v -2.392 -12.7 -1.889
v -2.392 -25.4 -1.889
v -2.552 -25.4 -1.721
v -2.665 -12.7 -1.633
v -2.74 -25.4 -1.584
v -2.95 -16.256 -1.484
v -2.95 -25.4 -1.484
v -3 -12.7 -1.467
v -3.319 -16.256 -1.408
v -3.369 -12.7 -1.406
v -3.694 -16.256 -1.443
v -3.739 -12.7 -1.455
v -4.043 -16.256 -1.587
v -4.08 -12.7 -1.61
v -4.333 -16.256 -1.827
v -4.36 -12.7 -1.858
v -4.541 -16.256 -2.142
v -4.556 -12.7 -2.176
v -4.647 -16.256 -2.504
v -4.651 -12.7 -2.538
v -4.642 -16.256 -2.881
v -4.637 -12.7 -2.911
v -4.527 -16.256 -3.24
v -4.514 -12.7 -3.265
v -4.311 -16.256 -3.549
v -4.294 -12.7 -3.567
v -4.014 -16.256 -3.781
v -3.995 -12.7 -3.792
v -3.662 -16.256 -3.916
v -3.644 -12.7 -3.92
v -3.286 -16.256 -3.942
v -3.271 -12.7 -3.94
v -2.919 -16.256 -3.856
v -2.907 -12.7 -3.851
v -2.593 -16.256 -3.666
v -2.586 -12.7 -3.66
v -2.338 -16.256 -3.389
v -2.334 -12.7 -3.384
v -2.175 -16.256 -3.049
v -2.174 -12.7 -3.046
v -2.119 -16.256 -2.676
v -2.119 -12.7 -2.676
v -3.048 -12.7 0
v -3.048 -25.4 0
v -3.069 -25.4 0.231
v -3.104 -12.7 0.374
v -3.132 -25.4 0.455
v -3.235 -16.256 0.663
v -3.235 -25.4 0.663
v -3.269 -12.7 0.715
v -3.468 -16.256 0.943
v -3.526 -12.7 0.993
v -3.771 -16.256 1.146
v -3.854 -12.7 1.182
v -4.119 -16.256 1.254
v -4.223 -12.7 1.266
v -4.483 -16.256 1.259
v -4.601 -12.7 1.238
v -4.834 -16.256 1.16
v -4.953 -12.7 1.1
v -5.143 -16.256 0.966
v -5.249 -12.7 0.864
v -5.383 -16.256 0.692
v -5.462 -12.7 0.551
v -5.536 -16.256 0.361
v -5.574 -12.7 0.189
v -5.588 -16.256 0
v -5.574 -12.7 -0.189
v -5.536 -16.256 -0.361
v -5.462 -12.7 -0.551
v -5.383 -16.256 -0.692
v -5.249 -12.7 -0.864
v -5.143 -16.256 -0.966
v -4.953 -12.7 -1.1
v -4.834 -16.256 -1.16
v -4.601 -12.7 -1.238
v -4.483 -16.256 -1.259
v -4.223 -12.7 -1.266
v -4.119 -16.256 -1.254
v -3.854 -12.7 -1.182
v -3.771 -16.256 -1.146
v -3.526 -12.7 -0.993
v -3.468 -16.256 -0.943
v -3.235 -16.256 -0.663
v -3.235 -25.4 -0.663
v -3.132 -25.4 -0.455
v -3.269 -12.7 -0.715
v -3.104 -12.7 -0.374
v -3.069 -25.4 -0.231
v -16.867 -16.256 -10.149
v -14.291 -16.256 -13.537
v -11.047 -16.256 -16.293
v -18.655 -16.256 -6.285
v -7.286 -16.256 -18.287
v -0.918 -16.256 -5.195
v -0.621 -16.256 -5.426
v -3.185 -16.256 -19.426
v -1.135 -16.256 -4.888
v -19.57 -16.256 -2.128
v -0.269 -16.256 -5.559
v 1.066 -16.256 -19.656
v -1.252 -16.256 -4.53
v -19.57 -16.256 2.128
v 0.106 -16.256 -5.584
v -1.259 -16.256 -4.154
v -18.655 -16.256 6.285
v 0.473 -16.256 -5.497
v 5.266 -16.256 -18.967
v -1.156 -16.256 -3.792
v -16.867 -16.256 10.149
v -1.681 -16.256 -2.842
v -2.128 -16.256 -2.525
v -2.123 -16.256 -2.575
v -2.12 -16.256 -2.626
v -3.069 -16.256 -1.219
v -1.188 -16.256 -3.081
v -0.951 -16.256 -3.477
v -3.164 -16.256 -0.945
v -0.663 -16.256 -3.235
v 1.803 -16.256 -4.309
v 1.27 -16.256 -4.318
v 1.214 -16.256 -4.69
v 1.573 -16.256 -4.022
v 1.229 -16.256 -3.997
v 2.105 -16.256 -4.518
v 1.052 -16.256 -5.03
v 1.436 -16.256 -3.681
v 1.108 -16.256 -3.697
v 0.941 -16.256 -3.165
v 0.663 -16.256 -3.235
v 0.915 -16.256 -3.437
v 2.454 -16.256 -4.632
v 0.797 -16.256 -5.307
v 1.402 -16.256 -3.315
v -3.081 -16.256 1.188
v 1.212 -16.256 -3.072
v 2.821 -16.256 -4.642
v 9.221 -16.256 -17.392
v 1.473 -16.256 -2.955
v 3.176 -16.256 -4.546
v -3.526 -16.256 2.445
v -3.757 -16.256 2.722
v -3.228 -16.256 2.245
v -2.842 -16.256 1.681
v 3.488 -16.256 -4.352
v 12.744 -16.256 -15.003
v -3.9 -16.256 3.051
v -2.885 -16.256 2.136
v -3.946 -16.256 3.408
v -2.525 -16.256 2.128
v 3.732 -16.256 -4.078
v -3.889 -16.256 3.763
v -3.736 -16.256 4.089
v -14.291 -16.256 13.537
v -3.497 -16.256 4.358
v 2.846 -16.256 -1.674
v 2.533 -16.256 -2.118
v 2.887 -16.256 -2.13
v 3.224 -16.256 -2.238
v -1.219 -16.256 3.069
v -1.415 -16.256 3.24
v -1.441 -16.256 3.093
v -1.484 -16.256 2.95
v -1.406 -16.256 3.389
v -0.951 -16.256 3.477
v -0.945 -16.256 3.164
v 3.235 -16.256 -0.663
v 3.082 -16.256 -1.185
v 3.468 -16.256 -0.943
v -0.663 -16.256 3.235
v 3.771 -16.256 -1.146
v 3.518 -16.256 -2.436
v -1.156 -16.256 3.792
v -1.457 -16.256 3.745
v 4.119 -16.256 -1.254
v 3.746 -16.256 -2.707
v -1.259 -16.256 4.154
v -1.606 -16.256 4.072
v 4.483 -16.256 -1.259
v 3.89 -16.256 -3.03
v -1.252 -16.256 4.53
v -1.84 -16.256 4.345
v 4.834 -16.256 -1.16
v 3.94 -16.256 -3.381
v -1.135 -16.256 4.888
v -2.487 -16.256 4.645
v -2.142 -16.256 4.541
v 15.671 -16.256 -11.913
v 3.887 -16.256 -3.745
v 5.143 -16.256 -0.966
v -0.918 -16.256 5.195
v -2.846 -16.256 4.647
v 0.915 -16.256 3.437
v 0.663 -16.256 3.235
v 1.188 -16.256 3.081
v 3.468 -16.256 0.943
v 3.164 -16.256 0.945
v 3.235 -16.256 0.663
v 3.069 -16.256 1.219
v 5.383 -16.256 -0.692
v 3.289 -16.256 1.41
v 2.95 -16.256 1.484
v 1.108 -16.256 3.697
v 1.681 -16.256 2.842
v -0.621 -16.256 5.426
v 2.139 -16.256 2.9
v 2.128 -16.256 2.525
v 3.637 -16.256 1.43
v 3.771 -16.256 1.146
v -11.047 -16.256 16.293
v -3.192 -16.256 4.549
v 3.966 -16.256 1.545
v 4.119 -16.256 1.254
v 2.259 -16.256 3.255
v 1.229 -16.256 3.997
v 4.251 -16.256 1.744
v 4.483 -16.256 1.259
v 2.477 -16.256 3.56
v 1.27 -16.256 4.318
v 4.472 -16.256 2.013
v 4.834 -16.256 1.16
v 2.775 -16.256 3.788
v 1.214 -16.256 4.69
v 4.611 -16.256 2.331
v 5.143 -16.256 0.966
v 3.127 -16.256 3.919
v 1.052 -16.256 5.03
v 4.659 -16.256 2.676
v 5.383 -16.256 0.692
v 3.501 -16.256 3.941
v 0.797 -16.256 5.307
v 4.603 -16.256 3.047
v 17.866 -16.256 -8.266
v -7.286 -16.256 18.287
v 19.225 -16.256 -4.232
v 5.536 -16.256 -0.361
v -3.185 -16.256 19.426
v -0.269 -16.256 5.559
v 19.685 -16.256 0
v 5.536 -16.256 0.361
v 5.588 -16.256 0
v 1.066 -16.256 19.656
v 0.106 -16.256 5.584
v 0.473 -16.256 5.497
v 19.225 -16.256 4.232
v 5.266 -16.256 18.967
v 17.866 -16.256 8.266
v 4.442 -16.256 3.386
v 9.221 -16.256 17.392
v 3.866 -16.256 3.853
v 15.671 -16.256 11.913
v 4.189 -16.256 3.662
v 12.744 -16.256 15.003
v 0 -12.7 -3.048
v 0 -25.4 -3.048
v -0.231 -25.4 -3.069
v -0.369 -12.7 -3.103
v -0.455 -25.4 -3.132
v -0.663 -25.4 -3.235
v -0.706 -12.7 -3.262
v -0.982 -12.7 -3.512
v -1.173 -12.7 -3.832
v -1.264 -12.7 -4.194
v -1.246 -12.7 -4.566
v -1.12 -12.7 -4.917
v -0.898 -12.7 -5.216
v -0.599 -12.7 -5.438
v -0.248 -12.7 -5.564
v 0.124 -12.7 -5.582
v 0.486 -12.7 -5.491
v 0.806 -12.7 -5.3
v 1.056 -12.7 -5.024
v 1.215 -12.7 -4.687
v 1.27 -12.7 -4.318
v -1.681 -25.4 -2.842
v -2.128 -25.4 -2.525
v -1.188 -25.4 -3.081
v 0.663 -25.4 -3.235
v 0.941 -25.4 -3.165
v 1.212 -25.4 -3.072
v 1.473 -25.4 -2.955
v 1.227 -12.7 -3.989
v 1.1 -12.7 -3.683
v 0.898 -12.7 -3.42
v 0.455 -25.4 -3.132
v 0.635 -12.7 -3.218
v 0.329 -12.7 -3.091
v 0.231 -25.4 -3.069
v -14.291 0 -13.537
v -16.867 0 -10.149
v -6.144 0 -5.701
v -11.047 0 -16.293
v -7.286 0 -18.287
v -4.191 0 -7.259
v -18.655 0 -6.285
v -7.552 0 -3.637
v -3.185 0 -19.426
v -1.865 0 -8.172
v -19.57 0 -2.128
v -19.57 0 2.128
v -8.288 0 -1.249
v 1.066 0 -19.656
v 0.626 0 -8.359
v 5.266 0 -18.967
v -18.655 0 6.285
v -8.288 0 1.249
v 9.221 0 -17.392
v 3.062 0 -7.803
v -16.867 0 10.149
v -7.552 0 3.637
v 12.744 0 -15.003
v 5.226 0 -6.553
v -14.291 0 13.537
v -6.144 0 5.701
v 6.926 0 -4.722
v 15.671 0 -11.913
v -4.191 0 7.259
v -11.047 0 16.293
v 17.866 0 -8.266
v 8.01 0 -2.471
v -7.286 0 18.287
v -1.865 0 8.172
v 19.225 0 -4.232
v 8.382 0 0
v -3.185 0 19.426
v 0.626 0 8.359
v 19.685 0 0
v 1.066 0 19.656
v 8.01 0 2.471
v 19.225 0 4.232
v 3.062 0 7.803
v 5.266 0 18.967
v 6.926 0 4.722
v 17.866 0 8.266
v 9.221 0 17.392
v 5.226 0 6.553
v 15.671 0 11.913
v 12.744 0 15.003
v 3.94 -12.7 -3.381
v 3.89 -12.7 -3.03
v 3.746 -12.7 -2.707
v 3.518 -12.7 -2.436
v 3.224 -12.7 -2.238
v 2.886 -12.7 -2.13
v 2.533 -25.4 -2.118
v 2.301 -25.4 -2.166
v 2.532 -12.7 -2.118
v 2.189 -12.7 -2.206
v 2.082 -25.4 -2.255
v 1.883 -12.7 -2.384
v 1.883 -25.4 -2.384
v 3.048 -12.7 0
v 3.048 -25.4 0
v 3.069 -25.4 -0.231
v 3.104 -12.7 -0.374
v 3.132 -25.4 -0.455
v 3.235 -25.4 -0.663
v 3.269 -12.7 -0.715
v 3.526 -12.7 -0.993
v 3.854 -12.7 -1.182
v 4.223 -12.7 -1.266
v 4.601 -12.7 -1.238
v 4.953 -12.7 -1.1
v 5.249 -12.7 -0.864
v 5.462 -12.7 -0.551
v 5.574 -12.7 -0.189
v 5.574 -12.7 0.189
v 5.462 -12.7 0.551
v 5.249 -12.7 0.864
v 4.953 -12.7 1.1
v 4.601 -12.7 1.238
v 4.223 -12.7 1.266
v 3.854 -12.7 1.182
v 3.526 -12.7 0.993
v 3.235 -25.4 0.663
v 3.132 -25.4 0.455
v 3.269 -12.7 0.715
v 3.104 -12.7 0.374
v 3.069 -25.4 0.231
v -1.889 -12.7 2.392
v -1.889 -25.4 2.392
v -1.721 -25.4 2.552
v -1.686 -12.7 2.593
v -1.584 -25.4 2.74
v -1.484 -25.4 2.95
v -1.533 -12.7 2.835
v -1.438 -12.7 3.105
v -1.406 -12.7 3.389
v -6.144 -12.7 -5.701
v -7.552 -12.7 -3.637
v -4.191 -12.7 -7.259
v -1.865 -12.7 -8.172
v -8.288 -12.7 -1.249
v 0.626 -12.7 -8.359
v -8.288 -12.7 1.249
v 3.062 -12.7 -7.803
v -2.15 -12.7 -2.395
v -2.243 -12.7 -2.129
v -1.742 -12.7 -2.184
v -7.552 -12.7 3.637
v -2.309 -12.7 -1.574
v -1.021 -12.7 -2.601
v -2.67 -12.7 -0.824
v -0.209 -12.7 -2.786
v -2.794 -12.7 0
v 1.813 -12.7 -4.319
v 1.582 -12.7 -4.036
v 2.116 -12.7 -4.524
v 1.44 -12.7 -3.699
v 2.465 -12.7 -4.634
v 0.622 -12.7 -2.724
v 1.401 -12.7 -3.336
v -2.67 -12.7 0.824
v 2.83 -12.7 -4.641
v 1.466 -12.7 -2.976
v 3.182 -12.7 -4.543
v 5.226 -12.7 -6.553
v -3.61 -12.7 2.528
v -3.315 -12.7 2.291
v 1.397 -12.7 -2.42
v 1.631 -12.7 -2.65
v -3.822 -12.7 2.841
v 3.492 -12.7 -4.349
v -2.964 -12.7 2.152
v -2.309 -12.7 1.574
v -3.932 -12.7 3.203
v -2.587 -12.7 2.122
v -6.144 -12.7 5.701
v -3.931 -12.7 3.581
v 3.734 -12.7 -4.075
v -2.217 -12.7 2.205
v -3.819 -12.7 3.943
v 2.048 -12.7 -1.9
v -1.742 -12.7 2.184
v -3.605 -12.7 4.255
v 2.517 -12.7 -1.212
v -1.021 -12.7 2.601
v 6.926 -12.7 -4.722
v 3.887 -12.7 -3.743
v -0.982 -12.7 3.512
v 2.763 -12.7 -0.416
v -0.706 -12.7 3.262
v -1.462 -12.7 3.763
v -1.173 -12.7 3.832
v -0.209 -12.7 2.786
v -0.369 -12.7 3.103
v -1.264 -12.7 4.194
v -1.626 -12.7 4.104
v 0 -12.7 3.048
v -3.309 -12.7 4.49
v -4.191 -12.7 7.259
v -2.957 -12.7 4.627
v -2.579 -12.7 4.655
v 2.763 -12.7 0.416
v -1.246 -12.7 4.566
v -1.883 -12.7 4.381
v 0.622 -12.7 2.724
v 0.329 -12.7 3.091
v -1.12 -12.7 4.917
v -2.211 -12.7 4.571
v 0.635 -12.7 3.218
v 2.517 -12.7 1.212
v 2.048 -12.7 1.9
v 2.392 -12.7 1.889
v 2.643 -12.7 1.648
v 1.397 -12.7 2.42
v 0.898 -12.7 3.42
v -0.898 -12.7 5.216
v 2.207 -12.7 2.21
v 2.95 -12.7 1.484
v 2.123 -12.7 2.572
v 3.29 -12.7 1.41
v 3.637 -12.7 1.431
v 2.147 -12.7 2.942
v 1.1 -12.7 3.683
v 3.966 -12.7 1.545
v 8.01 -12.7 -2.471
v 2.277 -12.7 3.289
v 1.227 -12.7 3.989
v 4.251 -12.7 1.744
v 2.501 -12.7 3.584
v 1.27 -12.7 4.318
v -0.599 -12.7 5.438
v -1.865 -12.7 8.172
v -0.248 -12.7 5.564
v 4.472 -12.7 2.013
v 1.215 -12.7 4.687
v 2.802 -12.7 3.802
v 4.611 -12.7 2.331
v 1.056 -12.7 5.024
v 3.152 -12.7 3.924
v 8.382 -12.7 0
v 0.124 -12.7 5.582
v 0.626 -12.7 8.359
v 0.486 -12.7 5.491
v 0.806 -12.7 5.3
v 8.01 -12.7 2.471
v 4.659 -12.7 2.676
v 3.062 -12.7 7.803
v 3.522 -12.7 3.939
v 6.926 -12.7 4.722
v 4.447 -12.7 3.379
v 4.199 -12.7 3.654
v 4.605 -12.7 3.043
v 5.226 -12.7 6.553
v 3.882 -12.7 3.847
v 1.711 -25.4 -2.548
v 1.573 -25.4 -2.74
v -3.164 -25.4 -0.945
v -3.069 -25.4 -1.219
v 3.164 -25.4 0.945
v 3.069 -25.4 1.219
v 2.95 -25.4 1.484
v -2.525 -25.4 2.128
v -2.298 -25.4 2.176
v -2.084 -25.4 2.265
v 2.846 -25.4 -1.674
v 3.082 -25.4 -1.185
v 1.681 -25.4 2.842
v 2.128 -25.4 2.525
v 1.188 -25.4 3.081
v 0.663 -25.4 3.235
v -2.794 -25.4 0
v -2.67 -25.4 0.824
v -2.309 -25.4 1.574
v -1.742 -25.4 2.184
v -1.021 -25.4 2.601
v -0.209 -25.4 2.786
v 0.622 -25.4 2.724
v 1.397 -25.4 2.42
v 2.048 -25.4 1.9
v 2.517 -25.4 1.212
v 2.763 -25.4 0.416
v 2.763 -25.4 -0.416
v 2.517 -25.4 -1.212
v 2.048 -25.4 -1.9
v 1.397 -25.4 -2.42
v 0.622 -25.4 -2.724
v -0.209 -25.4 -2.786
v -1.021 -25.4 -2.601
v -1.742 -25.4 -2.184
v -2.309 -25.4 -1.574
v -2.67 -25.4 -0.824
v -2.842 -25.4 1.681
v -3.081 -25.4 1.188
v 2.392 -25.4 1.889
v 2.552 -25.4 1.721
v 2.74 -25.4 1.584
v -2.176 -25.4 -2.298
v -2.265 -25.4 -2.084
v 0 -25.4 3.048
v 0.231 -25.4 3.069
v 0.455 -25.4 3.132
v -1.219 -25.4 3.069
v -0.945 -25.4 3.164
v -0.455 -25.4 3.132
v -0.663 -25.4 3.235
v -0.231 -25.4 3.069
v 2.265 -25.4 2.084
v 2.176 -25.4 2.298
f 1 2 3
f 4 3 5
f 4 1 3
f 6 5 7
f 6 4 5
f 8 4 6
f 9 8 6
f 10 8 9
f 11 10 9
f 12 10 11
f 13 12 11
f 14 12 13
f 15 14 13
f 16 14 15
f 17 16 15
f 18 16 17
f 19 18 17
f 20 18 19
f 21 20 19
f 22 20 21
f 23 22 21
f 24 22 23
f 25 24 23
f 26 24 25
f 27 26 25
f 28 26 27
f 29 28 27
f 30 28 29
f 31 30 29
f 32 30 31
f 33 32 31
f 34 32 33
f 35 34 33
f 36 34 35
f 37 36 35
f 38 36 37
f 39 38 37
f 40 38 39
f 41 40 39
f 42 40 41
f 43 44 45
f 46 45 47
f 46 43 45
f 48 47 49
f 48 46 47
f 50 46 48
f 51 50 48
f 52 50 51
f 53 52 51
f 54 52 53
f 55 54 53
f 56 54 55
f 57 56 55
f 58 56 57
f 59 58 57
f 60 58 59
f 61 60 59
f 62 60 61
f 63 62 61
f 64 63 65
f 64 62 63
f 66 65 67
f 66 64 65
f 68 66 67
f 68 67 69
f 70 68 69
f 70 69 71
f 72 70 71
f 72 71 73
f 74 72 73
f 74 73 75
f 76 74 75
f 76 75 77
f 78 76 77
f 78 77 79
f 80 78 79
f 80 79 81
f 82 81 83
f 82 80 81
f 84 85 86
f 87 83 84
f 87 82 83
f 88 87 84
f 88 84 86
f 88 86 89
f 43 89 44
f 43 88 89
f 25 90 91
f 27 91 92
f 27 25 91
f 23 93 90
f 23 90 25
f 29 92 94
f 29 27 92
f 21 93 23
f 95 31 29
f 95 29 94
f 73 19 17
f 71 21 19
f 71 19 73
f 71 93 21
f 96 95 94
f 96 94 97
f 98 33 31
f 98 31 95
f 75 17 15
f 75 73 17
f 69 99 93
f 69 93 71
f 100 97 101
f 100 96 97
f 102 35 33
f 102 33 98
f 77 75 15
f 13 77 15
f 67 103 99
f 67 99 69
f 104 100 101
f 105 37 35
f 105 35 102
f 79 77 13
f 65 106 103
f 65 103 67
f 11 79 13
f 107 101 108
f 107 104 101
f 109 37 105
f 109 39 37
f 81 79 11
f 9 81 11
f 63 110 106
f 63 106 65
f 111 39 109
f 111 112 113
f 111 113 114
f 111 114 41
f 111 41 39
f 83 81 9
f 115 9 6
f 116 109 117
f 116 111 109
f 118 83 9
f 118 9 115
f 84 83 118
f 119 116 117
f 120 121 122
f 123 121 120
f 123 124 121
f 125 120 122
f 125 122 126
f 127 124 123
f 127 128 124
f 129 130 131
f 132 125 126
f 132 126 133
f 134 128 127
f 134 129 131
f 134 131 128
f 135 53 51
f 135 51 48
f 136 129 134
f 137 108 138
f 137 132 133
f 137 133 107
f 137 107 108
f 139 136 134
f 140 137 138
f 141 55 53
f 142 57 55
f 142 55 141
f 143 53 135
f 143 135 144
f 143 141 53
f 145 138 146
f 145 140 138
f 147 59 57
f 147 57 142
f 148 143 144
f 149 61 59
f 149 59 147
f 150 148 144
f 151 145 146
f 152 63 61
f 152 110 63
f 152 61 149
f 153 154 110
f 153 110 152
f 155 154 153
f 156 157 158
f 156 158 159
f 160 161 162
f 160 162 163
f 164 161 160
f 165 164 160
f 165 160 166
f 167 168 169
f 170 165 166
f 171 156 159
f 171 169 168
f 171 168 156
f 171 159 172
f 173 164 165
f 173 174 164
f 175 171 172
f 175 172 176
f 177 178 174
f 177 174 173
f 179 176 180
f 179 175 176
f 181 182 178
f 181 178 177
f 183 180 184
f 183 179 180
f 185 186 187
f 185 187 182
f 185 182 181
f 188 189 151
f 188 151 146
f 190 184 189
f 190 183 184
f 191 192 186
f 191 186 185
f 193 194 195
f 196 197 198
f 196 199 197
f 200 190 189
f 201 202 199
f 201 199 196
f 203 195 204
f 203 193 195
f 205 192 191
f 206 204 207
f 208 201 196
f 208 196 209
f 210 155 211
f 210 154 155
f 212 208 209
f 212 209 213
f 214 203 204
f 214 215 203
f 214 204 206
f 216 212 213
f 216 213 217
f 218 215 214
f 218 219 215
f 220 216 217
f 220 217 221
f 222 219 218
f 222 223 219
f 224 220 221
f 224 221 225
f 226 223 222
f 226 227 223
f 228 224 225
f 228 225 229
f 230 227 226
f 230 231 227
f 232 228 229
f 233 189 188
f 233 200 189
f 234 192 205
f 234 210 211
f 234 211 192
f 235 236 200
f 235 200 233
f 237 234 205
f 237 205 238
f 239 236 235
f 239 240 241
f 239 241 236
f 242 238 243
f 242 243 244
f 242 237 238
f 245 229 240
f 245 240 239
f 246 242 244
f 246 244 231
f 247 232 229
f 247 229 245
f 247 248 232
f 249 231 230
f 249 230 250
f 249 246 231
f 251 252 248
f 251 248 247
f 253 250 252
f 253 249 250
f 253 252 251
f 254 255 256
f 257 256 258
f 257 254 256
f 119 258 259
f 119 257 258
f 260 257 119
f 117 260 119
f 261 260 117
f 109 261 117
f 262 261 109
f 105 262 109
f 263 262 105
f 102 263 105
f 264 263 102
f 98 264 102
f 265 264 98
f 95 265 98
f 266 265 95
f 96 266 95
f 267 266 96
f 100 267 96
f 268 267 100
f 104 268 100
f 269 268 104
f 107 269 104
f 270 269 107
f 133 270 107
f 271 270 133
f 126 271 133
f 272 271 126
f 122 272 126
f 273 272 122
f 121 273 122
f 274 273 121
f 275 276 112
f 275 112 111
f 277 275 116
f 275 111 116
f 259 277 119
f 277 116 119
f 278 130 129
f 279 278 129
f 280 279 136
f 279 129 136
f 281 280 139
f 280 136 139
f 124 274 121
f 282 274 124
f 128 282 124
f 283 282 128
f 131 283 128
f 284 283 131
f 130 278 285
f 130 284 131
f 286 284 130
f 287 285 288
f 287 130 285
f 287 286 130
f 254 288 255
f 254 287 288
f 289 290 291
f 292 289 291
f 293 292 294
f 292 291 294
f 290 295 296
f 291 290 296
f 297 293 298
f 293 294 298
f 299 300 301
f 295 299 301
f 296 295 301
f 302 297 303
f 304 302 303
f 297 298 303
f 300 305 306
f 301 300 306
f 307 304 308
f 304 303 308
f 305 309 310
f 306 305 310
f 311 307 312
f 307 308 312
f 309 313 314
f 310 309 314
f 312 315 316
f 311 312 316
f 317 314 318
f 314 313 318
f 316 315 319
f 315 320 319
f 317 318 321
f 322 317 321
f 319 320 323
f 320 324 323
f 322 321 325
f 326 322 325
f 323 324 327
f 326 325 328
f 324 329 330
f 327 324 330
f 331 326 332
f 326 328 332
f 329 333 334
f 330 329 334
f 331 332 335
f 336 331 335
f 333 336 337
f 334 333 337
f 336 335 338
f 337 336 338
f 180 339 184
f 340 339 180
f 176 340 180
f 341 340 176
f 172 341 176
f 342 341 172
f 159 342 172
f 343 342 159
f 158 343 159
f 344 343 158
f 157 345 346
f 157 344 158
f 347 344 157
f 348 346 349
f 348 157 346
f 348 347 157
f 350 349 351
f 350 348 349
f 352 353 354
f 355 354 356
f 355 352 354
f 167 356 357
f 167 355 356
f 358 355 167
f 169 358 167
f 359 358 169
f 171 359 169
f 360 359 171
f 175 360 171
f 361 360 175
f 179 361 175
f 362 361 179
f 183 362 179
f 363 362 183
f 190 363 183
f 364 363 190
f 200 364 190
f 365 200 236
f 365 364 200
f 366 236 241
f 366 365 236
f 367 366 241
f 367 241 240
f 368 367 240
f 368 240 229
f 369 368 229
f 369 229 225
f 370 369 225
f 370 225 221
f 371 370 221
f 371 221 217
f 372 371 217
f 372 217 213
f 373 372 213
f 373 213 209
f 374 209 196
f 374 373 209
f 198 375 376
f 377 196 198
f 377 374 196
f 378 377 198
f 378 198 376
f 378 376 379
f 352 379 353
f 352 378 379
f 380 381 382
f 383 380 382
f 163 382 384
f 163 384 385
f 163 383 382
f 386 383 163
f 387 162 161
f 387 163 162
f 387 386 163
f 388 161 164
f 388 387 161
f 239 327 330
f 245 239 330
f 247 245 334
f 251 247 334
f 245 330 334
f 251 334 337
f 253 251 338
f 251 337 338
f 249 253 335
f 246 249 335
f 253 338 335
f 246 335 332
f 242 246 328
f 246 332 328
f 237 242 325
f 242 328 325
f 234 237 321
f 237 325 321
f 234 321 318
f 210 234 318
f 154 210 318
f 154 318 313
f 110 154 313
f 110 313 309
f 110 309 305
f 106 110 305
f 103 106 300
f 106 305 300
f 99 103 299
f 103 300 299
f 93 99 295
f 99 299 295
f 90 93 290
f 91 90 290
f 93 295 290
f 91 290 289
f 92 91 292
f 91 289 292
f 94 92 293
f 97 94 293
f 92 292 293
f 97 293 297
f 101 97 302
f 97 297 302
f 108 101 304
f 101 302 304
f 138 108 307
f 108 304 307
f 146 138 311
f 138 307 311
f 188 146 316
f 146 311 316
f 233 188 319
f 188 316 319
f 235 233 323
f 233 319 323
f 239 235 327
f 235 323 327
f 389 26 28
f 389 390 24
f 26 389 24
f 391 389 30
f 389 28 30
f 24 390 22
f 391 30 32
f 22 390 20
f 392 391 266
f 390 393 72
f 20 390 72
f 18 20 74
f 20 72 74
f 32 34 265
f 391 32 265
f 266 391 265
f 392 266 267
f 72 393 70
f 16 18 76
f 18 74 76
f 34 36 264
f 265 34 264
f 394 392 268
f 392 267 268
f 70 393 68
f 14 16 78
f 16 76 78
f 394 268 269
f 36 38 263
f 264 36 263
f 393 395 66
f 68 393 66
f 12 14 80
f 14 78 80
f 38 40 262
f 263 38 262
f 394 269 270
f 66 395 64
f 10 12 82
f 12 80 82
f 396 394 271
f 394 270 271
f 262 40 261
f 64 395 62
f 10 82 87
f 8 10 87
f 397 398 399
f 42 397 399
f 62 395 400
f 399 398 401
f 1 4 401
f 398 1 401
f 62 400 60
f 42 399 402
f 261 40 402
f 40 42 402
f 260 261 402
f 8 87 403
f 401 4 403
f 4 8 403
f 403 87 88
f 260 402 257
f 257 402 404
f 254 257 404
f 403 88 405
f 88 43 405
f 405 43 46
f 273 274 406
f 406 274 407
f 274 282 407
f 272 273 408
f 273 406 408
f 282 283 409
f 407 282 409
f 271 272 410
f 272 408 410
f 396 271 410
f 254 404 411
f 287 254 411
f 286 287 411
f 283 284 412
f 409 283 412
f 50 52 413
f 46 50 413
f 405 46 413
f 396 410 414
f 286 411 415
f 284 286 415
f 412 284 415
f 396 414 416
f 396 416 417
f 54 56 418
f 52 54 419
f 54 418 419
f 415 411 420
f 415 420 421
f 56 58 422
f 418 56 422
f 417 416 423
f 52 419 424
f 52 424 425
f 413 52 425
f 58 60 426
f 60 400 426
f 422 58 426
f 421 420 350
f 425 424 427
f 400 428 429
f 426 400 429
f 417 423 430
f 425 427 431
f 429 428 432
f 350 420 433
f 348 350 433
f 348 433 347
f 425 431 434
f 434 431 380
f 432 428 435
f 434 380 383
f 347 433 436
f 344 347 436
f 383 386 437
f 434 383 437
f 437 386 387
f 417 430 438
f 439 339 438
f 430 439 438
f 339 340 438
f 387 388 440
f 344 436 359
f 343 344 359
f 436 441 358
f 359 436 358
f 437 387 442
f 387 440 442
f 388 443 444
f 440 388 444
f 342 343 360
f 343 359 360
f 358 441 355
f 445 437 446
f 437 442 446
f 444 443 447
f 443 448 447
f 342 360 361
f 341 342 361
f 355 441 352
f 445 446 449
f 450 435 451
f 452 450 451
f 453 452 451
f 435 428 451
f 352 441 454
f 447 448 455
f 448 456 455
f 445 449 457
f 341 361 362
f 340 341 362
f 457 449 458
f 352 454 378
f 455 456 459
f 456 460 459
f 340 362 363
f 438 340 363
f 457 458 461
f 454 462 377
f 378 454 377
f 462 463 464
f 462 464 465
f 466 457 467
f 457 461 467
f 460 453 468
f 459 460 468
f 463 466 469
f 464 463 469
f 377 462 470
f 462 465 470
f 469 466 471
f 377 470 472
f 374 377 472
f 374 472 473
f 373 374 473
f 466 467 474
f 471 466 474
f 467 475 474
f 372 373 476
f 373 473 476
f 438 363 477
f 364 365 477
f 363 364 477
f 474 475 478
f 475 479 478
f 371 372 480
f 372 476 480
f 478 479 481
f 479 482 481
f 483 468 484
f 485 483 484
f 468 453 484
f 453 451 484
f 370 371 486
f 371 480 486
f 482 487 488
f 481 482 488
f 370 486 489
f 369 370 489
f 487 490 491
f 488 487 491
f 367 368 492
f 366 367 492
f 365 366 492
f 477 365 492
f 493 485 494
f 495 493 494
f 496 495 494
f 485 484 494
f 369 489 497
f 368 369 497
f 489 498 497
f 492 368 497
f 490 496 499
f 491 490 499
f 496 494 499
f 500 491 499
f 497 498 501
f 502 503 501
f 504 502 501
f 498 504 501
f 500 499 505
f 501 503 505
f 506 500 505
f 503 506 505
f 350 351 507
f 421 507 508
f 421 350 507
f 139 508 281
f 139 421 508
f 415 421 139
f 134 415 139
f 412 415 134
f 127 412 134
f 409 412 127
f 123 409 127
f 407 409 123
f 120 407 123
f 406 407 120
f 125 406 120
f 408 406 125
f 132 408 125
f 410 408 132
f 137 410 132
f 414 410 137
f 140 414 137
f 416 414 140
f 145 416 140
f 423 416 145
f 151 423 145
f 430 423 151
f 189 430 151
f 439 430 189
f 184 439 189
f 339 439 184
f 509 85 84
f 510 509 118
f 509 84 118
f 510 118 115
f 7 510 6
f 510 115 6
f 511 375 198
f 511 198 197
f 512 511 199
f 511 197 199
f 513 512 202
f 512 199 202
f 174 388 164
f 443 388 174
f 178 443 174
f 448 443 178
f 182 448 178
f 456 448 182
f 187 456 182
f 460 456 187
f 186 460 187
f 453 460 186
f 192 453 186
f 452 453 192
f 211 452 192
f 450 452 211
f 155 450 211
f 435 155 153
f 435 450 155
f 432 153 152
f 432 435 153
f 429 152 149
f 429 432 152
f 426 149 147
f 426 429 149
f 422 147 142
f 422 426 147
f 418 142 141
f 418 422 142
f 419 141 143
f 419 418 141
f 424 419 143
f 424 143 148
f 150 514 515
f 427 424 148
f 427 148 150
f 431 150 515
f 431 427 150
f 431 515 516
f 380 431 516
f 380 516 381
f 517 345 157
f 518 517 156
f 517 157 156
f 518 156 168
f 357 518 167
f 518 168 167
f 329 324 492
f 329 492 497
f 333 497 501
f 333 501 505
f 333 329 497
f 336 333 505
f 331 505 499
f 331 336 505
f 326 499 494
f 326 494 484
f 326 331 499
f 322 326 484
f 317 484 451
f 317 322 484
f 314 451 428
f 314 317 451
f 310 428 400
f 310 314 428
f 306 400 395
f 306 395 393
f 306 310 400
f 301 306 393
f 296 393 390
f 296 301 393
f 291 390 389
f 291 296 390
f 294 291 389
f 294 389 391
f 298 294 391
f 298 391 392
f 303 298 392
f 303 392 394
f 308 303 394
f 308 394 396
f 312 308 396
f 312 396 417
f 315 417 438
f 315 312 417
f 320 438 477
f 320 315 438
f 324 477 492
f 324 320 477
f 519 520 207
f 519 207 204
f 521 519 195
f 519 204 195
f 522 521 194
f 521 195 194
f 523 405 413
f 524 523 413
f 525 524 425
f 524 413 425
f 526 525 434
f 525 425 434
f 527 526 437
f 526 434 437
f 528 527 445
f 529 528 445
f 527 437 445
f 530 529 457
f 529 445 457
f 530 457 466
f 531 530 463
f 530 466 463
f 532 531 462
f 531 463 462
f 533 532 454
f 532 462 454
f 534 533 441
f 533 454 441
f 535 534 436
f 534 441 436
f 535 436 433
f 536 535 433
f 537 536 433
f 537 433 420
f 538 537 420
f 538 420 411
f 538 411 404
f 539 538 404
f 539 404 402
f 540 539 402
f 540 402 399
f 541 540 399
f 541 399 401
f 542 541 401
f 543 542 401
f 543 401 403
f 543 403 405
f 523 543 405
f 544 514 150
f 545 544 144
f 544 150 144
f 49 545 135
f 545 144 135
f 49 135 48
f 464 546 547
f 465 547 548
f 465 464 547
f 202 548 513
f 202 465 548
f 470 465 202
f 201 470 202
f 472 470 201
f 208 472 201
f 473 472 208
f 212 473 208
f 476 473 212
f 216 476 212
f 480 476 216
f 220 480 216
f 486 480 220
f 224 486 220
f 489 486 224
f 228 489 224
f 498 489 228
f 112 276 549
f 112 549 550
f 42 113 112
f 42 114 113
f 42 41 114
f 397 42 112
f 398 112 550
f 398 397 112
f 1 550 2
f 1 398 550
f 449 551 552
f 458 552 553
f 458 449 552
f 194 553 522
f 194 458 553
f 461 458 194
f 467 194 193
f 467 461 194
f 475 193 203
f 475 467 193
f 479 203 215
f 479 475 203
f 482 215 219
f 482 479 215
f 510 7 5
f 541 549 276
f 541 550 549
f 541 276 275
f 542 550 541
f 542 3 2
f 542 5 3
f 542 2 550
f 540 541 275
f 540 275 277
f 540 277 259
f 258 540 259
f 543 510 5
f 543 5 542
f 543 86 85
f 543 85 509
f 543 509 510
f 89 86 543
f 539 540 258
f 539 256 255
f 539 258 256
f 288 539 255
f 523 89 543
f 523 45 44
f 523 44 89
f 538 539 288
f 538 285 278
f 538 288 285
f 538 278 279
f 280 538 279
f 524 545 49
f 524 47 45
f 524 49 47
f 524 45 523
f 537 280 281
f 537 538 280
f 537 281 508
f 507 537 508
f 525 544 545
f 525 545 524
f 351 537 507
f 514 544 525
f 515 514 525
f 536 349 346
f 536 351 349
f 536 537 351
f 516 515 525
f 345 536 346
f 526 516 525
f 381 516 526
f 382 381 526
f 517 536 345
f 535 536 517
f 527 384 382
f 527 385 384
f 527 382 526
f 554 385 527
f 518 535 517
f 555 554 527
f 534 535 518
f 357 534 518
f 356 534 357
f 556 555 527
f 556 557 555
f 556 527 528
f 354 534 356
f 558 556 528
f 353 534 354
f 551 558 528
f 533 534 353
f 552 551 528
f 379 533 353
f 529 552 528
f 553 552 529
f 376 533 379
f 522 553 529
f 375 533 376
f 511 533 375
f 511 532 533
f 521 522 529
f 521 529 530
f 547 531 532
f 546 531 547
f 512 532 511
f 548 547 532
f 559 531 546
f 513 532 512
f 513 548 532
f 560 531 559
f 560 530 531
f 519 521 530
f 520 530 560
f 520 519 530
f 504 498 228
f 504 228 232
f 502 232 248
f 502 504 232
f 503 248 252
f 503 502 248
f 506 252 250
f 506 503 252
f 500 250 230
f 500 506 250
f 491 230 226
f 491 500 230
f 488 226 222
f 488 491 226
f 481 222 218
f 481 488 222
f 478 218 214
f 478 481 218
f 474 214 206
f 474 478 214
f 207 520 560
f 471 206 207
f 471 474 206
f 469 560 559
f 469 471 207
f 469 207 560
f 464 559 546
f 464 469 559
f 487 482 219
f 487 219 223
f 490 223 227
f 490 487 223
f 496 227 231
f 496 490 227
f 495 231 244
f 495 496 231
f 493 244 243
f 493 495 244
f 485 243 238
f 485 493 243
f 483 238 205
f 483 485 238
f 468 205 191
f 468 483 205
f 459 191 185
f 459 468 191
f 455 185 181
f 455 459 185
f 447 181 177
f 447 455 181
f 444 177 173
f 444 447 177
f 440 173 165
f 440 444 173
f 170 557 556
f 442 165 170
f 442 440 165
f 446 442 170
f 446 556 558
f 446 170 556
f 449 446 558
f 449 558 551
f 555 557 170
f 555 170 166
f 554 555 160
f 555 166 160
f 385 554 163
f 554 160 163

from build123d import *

# Parameters (mm, degrees)
F0_R     = 19.685
F1_DEPTH = 16.256
F2_R     = 8.382
F3_DEPTH = 12.7
F4_R     = 3.302
F5_DEPTH = 9.144
F6_R     = 1.27
F7_DEPTH = 25.4
F8_R     = 2.794
F9_DEPTH = 25.4


# Not quite as in the source:
# - a feature names something its author has since deleted; it is built from what else it names


with BuildPart() as f1:
    # F0 (on Front) → F1 (new body)
    with BuildSketch(Plane.XZ):
        Circle(F0_R)
    extrude(amount=F1_DEPTH)

    # F2 (on Front) → F3 (cut)
    with BuildSketch(Plane.XZ):
        Circle(F2_R)
    extrude(amount=F3_DEPTH, mode=Mode.SUBTRACT)

    # F4 (on face) → F5 (join)
    with BuildSketch(Plane.XZ.offset(16.256)):
        Circle(F4_R)
    extrude(amount=F5_DEPTH)

    # F6 (on Front) → F7 (cut)
    with BuildSketch(Plane.XZ):
        with BuildLine():
            ThreePointArc((1.27, 4.318), (-0.8980256121, 5.2160256121), (0, 3.048))
            ThreePointArc((0, 3.048), (0.8980256121, 3.4199743879), (1.27, 4.318))
        make_face()
        with BuildLine():
            ThreePointArc((-1.4060126705, 3.3888169304), (-3.8189189305, 3.9425906032), (-1.8889501203, 2.3921060685))
            ThreePointArc((-1.8889501203, 2.3921060685), (-1.5331064104, 2.8350432576), (-1.4060126705, 3.3888169304))
        make_face()
        with Locations((-4.318, 0)):
            Circle(F6_R)
        with BuildLine():
            ThreePointArc((-2.1188169304, -2.6760126705), (-2.1890830443, -2.259433023), (-2.3921060685, -1.8889501203))
            ThreePointArc((-2.3921060685, -1.8889501203), (-4.5885508164, -3.092592318), (-2.1188169304, -2.6760126705))
        make_face()
        with BuildLine():
            ThreePointArc((1.27, -4.318), (0.8980256121, -3.4199743879), (0, -3.048))
            ThreePointArc((0, -3.048), (-0.8980256121, -5.2160256121), (1.27, -4.318))
        make_face()
        with BuildLine():
            ThreePointArc((3.9398354632, -3.3809943125), (3.2236091359, -2.2380880524), (1.882772913, -2.3842834506))
            ThreePointArc((1.882772913, -2.3842834506), (2.1160617904, -4.5239005725), (3.9398354632, -3.3809943125))
        make_face()
        with BuildLine():
            ThreePointArc((5.588, 0), (4.318, 1.27), (3.048, 0))
            ThreePointArc((3.048, 0), (4.318, -1.27), (5.588, 0))
        make_face()
        with BuildLine():
            ThreePointArc((4.6588169304, 2.6760126705), (2.9722372829, 3.8757465565), (2.3921060685, 1.8889501203))
            ThreePointArc((2.3921060685, 1.8889501203), (3.8053965779, 1.4762787844), (4.6588169304, 2.6760126705))
        make_face()
    extrude(amount=F7_DEPTH, mode=Mode.SUBTRACT)

    # F8 (on face) → F9 (cut)
    with BuildSketch(Plane(origin=(0, -12.7, 0), x_dir=(-1, 0, 0), z_dir=(0, 1, 0))):
        Circle(F8_R)
    extrude(amount=-F9_DEPTH, mode=Mode.SUBTRACT)


solid = f1.part
